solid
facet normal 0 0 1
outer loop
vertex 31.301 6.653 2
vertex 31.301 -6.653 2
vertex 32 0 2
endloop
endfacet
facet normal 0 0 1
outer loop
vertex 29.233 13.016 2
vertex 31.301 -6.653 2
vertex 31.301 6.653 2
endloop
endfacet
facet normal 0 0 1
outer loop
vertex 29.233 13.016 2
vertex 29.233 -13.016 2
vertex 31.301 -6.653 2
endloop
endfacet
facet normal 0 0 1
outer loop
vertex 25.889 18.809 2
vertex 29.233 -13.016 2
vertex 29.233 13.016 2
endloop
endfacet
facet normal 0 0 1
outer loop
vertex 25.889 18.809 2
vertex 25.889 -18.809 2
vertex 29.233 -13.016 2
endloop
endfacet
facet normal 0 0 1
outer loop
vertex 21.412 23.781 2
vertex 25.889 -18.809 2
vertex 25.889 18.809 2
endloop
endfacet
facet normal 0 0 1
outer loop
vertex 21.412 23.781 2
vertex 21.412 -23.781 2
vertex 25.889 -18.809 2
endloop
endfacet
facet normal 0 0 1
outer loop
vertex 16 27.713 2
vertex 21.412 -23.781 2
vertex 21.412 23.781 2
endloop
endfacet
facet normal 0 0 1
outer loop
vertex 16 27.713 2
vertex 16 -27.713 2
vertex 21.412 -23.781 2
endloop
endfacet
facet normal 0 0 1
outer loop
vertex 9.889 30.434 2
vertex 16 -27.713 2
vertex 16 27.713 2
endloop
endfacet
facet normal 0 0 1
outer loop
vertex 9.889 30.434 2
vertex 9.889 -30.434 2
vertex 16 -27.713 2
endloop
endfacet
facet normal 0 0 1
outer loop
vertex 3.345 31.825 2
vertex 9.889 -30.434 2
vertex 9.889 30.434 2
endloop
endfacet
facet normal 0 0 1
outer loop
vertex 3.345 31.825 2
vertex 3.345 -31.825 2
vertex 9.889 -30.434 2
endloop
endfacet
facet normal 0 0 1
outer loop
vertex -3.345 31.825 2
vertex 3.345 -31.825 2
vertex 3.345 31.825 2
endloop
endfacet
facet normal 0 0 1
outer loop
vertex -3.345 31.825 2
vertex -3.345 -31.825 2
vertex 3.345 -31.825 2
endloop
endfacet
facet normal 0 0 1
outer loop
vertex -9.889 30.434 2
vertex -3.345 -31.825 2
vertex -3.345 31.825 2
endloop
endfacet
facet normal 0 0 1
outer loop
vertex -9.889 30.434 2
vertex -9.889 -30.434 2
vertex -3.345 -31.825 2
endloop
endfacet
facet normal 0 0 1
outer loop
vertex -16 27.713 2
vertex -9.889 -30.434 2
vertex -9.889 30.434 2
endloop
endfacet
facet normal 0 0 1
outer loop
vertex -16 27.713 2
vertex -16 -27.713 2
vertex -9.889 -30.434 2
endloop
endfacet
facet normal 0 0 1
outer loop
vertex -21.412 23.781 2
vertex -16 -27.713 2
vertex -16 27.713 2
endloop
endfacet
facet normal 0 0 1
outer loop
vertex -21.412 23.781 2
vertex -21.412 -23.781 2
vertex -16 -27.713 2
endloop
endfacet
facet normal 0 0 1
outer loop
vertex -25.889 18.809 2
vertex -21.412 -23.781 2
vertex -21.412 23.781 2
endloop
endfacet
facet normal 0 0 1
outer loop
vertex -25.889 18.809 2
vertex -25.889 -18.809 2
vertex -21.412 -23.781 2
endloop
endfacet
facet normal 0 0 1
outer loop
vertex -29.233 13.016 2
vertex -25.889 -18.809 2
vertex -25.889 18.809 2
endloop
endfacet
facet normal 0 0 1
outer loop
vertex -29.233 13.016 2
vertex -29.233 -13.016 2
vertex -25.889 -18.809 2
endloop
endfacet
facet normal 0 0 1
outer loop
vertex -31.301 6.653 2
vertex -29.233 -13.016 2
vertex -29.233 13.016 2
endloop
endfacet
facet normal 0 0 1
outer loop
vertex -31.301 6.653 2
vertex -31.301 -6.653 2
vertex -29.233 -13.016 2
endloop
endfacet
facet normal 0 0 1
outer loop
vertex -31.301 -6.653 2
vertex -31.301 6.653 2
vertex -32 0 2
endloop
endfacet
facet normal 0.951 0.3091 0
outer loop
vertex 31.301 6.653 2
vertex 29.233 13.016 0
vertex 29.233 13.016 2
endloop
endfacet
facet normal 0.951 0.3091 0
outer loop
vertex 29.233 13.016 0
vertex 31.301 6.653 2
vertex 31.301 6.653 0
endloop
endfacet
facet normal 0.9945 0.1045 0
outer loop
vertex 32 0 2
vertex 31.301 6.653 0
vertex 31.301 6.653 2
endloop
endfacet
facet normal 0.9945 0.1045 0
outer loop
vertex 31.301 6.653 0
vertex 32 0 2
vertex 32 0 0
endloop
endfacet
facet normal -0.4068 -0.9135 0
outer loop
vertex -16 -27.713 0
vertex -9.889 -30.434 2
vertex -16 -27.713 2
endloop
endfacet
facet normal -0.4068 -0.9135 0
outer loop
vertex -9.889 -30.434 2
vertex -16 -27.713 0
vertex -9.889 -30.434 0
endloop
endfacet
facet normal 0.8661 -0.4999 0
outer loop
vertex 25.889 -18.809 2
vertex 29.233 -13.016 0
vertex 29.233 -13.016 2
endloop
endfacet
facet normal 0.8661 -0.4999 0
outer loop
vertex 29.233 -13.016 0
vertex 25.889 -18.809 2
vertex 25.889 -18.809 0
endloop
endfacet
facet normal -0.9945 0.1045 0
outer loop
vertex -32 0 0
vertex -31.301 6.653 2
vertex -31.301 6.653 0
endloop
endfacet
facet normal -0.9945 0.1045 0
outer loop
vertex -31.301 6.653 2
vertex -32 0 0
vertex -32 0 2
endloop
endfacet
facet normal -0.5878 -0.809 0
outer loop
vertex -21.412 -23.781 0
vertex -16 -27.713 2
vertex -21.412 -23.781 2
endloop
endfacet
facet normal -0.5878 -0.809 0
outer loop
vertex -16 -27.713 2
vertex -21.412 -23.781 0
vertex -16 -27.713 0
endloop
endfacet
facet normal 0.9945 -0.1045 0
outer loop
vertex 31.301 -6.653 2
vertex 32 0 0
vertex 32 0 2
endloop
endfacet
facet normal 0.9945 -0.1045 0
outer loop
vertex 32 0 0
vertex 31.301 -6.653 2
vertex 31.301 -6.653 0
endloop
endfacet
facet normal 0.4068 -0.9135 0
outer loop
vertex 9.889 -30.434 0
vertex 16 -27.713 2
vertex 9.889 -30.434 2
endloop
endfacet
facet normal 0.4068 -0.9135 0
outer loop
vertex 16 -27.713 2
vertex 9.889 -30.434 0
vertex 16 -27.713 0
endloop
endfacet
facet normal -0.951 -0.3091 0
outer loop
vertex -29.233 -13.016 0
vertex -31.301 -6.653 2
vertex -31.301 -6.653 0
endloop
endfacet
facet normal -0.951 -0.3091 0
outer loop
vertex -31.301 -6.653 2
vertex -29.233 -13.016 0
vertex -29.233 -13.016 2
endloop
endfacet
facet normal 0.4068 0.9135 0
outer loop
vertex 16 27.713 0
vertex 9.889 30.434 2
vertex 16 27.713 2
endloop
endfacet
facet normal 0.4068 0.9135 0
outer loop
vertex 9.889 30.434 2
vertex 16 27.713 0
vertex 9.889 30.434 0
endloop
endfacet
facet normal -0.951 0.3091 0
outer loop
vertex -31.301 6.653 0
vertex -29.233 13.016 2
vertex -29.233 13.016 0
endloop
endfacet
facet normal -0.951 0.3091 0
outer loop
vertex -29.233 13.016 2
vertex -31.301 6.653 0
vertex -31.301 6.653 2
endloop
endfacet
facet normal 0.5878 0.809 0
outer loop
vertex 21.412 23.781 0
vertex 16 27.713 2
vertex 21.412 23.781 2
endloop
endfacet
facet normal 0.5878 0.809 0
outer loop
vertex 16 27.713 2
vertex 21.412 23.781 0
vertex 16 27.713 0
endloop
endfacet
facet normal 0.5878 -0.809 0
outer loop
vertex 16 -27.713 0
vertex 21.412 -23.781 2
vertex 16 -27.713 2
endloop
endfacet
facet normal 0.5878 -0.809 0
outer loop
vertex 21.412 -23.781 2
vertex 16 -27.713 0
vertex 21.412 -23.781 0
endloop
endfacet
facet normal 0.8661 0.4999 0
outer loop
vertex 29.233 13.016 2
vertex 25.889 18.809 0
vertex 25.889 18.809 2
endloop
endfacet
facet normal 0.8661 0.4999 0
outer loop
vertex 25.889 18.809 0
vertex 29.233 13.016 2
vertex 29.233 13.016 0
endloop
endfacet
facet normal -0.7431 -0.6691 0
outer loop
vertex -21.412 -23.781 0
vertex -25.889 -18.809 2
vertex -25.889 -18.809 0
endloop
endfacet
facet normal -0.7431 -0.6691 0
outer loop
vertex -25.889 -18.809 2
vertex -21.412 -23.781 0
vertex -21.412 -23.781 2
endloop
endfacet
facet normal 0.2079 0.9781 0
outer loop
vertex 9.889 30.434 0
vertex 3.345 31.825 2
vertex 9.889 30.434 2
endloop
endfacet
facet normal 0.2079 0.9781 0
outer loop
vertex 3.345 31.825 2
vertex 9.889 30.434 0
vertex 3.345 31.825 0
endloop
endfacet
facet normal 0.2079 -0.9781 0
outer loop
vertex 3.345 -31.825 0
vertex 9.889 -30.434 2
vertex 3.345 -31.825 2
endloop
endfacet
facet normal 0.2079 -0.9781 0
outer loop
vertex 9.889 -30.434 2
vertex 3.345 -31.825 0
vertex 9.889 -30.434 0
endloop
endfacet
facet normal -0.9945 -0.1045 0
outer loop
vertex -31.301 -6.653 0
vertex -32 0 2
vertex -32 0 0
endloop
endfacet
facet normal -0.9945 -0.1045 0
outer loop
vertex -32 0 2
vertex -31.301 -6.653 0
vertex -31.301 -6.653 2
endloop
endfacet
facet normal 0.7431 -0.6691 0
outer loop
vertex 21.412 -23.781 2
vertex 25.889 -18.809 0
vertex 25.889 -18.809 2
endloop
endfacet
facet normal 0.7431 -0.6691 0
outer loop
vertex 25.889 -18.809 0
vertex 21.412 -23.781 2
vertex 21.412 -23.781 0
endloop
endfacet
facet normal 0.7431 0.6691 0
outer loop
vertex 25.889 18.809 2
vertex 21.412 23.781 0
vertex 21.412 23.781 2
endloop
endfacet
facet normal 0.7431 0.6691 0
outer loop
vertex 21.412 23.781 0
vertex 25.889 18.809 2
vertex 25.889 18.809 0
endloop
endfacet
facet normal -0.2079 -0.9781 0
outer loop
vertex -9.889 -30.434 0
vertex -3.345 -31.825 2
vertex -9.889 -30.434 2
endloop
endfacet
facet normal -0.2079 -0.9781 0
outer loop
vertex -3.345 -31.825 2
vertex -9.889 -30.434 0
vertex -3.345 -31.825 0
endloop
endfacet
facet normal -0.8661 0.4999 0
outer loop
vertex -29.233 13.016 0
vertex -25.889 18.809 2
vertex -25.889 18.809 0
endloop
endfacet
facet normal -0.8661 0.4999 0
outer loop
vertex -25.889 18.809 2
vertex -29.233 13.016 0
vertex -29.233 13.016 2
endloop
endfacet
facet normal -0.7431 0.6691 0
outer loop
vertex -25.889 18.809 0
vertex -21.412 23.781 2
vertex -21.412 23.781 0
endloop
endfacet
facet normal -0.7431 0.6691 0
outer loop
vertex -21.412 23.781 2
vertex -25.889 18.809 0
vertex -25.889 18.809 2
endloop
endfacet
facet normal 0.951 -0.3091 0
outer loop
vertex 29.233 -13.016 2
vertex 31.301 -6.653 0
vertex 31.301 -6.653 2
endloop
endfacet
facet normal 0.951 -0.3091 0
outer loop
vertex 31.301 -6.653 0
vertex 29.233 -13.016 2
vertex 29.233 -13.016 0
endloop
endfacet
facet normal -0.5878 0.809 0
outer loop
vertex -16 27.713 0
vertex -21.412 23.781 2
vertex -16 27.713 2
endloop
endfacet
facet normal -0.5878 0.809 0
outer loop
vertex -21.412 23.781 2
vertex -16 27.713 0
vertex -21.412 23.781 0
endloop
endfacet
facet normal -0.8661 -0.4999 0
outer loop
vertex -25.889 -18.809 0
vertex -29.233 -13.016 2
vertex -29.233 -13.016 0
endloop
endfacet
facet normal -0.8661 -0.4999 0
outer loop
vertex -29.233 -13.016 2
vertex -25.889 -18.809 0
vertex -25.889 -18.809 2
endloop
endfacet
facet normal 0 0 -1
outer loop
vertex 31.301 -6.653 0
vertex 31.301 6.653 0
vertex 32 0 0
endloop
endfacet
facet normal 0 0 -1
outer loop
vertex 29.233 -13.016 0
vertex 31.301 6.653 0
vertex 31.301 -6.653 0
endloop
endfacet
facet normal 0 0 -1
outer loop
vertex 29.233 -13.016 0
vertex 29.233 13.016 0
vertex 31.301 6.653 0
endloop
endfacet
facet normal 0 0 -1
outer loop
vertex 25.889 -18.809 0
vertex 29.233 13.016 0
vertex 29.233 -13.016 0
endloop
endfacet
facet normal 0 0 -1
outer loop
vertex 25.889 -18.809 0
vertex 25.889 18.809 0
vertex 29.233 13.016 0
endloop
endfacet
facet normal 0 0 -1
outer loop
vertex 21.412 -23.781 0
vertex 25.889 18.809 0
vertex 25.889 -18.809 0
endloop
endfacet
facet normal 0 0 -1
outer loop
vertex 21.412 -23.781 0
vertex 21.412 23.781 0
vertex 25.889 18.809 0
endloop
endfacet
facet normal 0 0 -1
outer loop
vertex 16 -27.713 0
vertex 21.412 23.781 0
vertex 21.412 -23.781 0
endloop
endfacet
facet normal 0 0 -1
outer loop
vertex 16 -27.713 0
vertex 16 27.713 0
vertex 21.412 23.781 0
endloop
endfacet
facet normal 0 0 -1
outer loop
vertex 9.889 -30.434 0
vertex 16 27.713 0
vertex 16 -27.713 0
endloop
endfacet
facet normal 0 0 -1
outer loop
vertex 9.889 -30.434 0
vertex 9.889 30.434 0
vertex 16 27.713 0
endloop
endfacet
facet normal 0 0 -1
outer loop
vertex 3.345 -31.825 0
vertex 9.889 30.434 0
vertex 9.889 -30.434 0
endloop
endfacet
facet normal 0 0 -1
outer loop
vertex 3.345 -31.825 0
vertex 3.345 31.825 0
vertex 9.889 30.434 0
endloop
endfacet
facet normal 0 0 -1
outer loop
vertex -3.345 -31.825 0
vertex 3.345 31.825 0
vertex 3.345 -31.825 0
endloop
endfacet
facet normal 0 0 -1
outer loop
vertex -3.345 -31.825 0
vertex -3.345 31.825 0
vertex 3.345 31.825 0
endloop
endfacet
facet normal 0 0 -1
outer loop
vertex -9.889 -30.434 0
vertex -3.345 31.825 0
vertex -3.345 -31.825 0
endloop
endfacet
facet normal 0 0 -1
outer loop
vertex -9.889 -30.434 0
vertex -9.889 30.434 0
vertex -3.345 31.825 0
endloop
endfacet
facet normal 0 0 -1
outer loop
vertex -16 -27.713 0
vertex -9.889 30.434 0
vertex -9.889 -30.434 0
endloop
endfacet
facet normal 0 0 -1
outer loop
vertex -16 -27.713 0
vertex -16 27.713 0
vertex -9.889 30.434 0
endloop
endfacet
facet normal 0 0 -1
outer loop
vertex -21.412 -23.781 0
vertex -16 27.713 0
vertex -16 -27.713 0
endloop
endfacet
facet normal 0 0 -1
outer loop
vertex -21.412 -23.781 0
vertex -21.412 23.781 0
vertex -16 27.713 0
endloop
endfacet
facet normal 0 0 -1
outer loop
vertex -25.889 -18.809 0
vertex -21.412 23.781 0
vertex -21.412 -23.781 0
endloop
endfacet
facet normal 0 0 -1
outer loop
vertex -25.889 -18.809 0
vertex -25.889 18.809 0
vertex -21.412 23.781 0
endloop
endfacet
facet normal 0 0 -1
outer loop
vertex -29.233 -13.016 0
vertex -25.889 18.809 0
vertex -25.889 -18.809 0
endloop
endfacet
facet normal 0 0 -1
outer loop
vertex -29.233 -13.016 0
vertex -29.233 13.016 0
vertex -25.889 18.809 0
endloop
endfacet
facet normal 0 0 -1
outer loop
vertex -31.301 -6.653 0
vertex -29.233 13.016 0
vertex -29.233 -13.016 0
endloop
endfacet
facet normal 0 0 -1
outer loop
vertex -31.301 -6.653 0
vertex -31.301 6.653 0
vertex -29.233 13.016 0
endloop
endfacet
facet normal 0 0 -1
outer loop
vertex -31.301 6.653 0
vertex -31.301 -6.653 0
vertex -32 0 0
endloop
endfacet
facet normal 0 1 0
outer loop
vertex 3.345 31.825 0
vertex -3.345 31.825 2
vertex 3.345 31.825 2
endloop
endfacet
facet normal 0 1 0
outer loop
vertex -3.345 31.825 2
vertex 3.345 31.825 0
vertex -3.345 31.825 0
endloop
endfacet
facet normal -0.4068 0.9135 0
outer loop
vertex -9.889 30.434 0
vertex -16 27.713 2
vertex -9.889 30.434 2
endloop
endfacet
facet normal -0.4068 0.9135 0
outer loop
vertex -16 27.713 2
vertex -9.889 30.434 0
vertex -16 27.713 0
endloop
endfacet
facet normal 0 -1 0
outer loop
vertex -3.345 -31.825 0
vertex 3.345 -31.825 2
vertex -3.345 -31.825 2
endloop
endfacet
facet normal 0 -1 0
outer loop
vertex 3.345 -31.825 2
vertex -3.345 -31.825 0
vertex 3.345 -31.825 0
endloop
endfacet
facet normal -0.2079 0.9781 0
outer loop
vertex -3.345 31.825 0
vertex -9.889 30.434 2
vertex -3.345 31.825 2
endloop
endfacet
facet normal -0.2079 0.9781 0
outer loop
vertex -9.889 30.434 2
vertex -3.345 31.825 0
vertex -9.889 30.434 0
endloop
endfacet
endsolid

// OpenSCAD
// Word to display
word = "thingiverse";

// Radius of coin
outer_radius = 32;

// Thickness of coin
coin_thickness = 2;

// Radius of writing
pendant_radius = 20;

// Radius of the large circles in a letter
letter_radius = 10;

// Thickness of writing
line_thickness = 1;

// Height of writing
line_height = 1;


/////////////////////////////////////////
//CUSTOMIZER VARIABLES END
/////////////////////////////////////////

large_circle_radius = letter_radius;
small_circle_radius = letter_radius/4;

large_dot_radius = letter_radius/7;
small_dot_radius = letter_radius/8;

dot_offset = large_circle_radius/4*3;

chars_in_word = lenWord(word, 0, len(word));
spacing_angle = 360 / chars_in_word;

// draw the coin if it's valid
if (len(word) > 0 && isValidWord(word))
{
  difference()
  {
    linear_extrude(height=coin_thickness)
      circle(outer_radius);

    translate([0,0,coin_thickness-line_height])
      linear_extrude(height=line_height+0.1)
      rotate([0,0,-90])
      write_circle();
  }
}
else
{
  echo("invalid input");
}

/////////////////////////////////////////
// TEXT HELPER ROUTINES

function isVowel(t,p,l) = (l - p > 0)
                       && (t[p] == "a" || t[p] == "e" || t[p] == "i" || t[p] == "o" || t[p] == "u");
function isConsWithH(t,p,l) = (l - p > 1)
                           && (t[p+1] == "h")
                           && (t[p] == "t" || t[p] == "s" || t[p] == "c");
function isConsNG(t,p,l) = (l - p > 1)
                        && t[p] == "n"
                        && t[p+1] == "g";
function isConsQU(t,p,l) = (l - p > 1)
                        && t[p] == "q"
                        && t[p+1] == "u";
function isCons2(t,p,l) = isConsWithH(t,p,l) || isConsNG(t,p,l) || isConsQU(t,p,l);
function isCons1(t,p,l) = (l - p > 0)
                       && (t[p] == "b" || t[p] == "d" || t[p] == "f" || t[p] == "g" || t[p] == "h" ||
                           t[p] == "j" || t[p] == "k" || t[p] == "l" || t[p] == "m" || t[p] == "n" ||
                           t[p] == "p" || t[p] == "t" || t[p] == "r" || t[p] == "s" || t[p] == "v" ||
                           t[p] == "w" || t[p] == "y" || t[p] == "z" || t[p] == "x");
function isCons2WithVowel(t,p,l) = isVowel(t,p+2,l) && isCons2(t,p,l);
function isCons1WithVowel(t,p,l) = isVowel(t,p+1,l) && isCons1(t,p,l);

function isValid(t,p,l) = l == p ? true
                        : isVowel(t,p,l) ? isValid(t,p+1,l)
                        : isCons2(t,p,l) ? isValid(t,p+2,l)
                        : isCons1(t,p,l) ? isValid(t,p+1,l) : false;

function lenWord(t,p,l) = isVowel(t,p,l) ? 1 + lenWord(t,p+1,l)
                        : isCons2WithVowel(t,p,l) ? 1 + lenWord(t,p+3,l)
                        : isCons1WithVowel(t,p,l) ? 1 + lenWord(t,p+2,l)
                        : isCons2(t,p,l) ? 1 + lenWord(t,p+2,l)
                        : isCons1(t,p,l) ? 1 + lenWord(t,p+1,l)
                        : 0;

function isValidWord(txt) = isValid(txt,0,len(txt));

function isLetterStart(s,t,p,l) = s == p ? true
                                : s < p ? false
                                : isVowel(t,p,l) ? isLetterStart(s,t,p+1,l)
                                : isCons2WithVowel(t,p,l) ? isLetterStart(s,t,p+3,l)
                                : isCons1WithVowel(t,p,l) ? isLetterStart(s,t,p+2,l)
                                : isCons2(t,p,l) ? isLetterStart(s,t,p+2,l)
                                : isCons1(t,p,l) ? isLetterStart(s,t,p+1,l)
                                : false;
function whichLetter(s,t,p,l) = s <= p ? 0
                                : isVowel(t,p,l) ? 1 + whichLetter(s,t,p+1,l)
                                : isCons2WithVowel(t,p,l) ? 1 + whichLetter(s,t,p+3,l)
                                : isCons1WithVowel(t,p,l) ? 1 + whichLetter(s,t,p+2,l)
                                : isCons2(t,p,l) ? 1 + whichLetter(s,t,p+2,l)
                                : isCons1(t,p,l) ? 1 + whichLetter(s,t,p+1,l)
                                : 0;

/////////////////////////////////////////
// GENERATE THE WRITING

module write_circle()
{
  for (letter = [0 : len(word)-1])
  {
    if (isLetterStart(letter, word, 0, len(word)))
    {
      rotate([0, 0, spacing_angle * whichLetter(letter, word, 0, len(word))])
        translate([pendant_radius, 0, 0])
        write_circle_letter(word, letter, len(word));
    }
  }
}

module write_circle_letter(t,p,l)
{
  // centered around positive x-axis

  if (p < l)
  {
    if (isVowel(t,p,l))
    {
      translate([-pendant_radius, 0, 0])
        arc_segment(spacing_angle, pendant_radius);

      write_vowel(t[p]);
    }
    else if (isCons2(t,p,l))
    {
      write_consonant(str(t[p],t[p+1]), isCons2WithVowel(t,p,l) ? t[p+2] : undef);
    }
    else if (isCons1(t,p,l))
    {
      write_consonant(t[p], isCons1WithVowel(t,p,l) ? t[p+1] : undef);
    }
    else
    {
      echo("wha? invalid character");
    }
  }
}

module write_vowel(c)
{
  if (c == "a")
  {
    translate([letter_radius/2,0,0])
      circle_line(small_circle_radius);
  }
  else if (c == "e")
  {
    circle_line(small_circle_radius);
  }
  else if (c == "i")
  {
    circle_line(small_circle_radius);
    rotate([0,0,180])
      translate([small_circle_radius,0,0])
      line(letter_radius - small_circle_radius);
  }
  else if (c == "o")
  {
    translate([-letter_radius/2,0,0])
    circle_line(small_circle_radius);
  }
  else if (c == "u")
  {
    circle_line(small_circle_radius);
    translate([small_circle_radius,0,0])
      line(letter_radius - small_circle_radius);
  }
  else
  {
    echo("wha? invalid vowel");
  }
}

module write_consonant(c,v)
{
  // SET 1
  if (c == "b" || c == "ch" || c == "d" || c == "f" || c == "g" || c == "h")
  {
    difference()
    {
      union()
      {
        translate([-pendant_radius, 0, 0])
          arc_segment(spacing_angle, pendant_radius);
        translate([-large_circle_radius,0,0])
          circle_line(large_circle_radius);
      }
      square(small_circle_radius*2, center=true);
    }

    translate([-large_circle_radius,0,0])
    {
      if (c == "ch")     write_circle_modifier(1);
      else if (c == "d") write_circle_modifier(2);
      else if (c == "f") write_circle_modifier(3);
      else if (c == "g") write_circle_modifier(4);
      else if (c == "h") write_circle_modifier(5);

      if (v) write_vowel(v);
    }
  }
  // SET 2
  else if (c == "j" || c == "k" || c == "l" || c == "m" || c == "n" || c == "p")
  {
    translate([-pendant_radius, 0, 0])
      arc_segment(spacing_angle, pendant_radius);

    translate([-large_circle_radius-large_dot_radius,0,0])
    {
      circle_line(large_circle_radius);

      if (c == "k")      write_circle_modifier(1);
      else if (c == "l") write_circle_modifier(2);
      else if (c == "m") write_circle_modifier(3);
      else if (c == "n") write_circle_modifier(4);
      else if (c == "p") write_circle_modifier(5);

      if (v) write_vowel(v);
    }
  }
  // SET 3
  else if (c == "t" || c == "sh" || c == "r" || c == "s" || c == "v" || c == "w")
  {
    difference()
    {
      translate([-pendant_radius, 0, 0])
        arc_segment(spacing_angle, pendant_radius);
      circle(large_circle_radius - line_thickness/2);
    }
    difference()
    {
      rotate(180) arc_segment(180, large_circle_radius);
      difference()
      {
        translate([-pendant_radius,0,0]) circle(pendant_radius+large_circle_radius);
        translate([-pendant_radius,0,0]) circle(pendant_radius);
      }
    }

    if (c == "sh")     write_circle_modifier(1);
    else if (c == "r") write_circle_modifier(2);
    else if (c == "s") write_circle_modifier(3);
    else if (c == "v") write_circle_modifier(4);
    else if (c == "w") write_circle_modifier(5);

    if (v) write_vowel(v);
  }
  // SET 4
  else if (c == "th" || c == "y" || c == "z" || c == "ng" || c == "qu" || c == "x")
  {
    translate([-pendant_radius, 0, 0])
      arc_segment(spacing_angle, pendant_radius);

    circle_line(large_circle_radius);

    if (c == "y")       write_circle_modifier(1);
    else if (c == "z")  write_circle_modifier(2);
    else if (c == "ng") write_circle_modifier(3);
    else if (c == "qu") write_circle_modifier(4);
    else if (c == "x")  write_circle_modifier(5);

    if (v) write_vowel(v);
  }
  else
  {
    echo("wha? invalid consonant");
  }
}

module write_circle_modifier(y)
{
  if (y == 1)
  {
    rotate(-45) translate([-dot_offset,0,0]) circle(large_dot_radius);
    rotate(-70) translate([-dot_offset,0,0]) circle(small_dot_radius);
  }
  else if (y == 2)
  {
    rotate(-40) translate([-dot_offset,0,0]) circle(small_dot_radius);
    rotate(-65) translate([-dot_offset,0,0]) circle(large_dot_radius);
    rotate(-90) translate([-dot_offset,0,0]) circle(small_dot_radius);
  }
  else if (y == 3)
  {
    rotate(180+15) translate([large_circle_radius,0,0]) line(letter_radius);
    rotate(180   ) translate([large_circle_radius,0,0]) line(letter_radius);
    rotate(180-15) translate([large_circle_radius,0,0]) line(letter_radius);
  }
  else if (y == 4)
  {
    rotate(180   ) translate([large_circle_radius,0,0]) line(letter_radius);
  }
  else if (y == 5)
  {
    rotate(180+15) translate([large_circle_radius,0,0]) line(letter_radius);
    rotate(180-15) translate([large_circle_radius,0,0]) line(letter_radius);
  }
}

/////////////////////////////////////////
// WRITING HELPERS

module arc_segment(angle, radius, thick)
{
  // centered around positive x-axis

  pos_x = cos(angle/2) * radius * 1.5;
  pos_y = sin(angle/2) * radius * 1.5;

  intersection()
  {
    if (angle < 360)
      polygon([ [0,0], [pos_x,-pos_y], [radius * 1.5,0], [pos_x,+pos_y] ]);

    circle_line(radius);
  }
}

module circle_line(radius)
{
  difference()
  {
    circle(radius + line_thickness/2);
    circle(radius - line_thickness/2);
  }
}

module line(length)
{
  translate([0,-line_thickness/2,0])
    square([length, line_thickness]);
}
